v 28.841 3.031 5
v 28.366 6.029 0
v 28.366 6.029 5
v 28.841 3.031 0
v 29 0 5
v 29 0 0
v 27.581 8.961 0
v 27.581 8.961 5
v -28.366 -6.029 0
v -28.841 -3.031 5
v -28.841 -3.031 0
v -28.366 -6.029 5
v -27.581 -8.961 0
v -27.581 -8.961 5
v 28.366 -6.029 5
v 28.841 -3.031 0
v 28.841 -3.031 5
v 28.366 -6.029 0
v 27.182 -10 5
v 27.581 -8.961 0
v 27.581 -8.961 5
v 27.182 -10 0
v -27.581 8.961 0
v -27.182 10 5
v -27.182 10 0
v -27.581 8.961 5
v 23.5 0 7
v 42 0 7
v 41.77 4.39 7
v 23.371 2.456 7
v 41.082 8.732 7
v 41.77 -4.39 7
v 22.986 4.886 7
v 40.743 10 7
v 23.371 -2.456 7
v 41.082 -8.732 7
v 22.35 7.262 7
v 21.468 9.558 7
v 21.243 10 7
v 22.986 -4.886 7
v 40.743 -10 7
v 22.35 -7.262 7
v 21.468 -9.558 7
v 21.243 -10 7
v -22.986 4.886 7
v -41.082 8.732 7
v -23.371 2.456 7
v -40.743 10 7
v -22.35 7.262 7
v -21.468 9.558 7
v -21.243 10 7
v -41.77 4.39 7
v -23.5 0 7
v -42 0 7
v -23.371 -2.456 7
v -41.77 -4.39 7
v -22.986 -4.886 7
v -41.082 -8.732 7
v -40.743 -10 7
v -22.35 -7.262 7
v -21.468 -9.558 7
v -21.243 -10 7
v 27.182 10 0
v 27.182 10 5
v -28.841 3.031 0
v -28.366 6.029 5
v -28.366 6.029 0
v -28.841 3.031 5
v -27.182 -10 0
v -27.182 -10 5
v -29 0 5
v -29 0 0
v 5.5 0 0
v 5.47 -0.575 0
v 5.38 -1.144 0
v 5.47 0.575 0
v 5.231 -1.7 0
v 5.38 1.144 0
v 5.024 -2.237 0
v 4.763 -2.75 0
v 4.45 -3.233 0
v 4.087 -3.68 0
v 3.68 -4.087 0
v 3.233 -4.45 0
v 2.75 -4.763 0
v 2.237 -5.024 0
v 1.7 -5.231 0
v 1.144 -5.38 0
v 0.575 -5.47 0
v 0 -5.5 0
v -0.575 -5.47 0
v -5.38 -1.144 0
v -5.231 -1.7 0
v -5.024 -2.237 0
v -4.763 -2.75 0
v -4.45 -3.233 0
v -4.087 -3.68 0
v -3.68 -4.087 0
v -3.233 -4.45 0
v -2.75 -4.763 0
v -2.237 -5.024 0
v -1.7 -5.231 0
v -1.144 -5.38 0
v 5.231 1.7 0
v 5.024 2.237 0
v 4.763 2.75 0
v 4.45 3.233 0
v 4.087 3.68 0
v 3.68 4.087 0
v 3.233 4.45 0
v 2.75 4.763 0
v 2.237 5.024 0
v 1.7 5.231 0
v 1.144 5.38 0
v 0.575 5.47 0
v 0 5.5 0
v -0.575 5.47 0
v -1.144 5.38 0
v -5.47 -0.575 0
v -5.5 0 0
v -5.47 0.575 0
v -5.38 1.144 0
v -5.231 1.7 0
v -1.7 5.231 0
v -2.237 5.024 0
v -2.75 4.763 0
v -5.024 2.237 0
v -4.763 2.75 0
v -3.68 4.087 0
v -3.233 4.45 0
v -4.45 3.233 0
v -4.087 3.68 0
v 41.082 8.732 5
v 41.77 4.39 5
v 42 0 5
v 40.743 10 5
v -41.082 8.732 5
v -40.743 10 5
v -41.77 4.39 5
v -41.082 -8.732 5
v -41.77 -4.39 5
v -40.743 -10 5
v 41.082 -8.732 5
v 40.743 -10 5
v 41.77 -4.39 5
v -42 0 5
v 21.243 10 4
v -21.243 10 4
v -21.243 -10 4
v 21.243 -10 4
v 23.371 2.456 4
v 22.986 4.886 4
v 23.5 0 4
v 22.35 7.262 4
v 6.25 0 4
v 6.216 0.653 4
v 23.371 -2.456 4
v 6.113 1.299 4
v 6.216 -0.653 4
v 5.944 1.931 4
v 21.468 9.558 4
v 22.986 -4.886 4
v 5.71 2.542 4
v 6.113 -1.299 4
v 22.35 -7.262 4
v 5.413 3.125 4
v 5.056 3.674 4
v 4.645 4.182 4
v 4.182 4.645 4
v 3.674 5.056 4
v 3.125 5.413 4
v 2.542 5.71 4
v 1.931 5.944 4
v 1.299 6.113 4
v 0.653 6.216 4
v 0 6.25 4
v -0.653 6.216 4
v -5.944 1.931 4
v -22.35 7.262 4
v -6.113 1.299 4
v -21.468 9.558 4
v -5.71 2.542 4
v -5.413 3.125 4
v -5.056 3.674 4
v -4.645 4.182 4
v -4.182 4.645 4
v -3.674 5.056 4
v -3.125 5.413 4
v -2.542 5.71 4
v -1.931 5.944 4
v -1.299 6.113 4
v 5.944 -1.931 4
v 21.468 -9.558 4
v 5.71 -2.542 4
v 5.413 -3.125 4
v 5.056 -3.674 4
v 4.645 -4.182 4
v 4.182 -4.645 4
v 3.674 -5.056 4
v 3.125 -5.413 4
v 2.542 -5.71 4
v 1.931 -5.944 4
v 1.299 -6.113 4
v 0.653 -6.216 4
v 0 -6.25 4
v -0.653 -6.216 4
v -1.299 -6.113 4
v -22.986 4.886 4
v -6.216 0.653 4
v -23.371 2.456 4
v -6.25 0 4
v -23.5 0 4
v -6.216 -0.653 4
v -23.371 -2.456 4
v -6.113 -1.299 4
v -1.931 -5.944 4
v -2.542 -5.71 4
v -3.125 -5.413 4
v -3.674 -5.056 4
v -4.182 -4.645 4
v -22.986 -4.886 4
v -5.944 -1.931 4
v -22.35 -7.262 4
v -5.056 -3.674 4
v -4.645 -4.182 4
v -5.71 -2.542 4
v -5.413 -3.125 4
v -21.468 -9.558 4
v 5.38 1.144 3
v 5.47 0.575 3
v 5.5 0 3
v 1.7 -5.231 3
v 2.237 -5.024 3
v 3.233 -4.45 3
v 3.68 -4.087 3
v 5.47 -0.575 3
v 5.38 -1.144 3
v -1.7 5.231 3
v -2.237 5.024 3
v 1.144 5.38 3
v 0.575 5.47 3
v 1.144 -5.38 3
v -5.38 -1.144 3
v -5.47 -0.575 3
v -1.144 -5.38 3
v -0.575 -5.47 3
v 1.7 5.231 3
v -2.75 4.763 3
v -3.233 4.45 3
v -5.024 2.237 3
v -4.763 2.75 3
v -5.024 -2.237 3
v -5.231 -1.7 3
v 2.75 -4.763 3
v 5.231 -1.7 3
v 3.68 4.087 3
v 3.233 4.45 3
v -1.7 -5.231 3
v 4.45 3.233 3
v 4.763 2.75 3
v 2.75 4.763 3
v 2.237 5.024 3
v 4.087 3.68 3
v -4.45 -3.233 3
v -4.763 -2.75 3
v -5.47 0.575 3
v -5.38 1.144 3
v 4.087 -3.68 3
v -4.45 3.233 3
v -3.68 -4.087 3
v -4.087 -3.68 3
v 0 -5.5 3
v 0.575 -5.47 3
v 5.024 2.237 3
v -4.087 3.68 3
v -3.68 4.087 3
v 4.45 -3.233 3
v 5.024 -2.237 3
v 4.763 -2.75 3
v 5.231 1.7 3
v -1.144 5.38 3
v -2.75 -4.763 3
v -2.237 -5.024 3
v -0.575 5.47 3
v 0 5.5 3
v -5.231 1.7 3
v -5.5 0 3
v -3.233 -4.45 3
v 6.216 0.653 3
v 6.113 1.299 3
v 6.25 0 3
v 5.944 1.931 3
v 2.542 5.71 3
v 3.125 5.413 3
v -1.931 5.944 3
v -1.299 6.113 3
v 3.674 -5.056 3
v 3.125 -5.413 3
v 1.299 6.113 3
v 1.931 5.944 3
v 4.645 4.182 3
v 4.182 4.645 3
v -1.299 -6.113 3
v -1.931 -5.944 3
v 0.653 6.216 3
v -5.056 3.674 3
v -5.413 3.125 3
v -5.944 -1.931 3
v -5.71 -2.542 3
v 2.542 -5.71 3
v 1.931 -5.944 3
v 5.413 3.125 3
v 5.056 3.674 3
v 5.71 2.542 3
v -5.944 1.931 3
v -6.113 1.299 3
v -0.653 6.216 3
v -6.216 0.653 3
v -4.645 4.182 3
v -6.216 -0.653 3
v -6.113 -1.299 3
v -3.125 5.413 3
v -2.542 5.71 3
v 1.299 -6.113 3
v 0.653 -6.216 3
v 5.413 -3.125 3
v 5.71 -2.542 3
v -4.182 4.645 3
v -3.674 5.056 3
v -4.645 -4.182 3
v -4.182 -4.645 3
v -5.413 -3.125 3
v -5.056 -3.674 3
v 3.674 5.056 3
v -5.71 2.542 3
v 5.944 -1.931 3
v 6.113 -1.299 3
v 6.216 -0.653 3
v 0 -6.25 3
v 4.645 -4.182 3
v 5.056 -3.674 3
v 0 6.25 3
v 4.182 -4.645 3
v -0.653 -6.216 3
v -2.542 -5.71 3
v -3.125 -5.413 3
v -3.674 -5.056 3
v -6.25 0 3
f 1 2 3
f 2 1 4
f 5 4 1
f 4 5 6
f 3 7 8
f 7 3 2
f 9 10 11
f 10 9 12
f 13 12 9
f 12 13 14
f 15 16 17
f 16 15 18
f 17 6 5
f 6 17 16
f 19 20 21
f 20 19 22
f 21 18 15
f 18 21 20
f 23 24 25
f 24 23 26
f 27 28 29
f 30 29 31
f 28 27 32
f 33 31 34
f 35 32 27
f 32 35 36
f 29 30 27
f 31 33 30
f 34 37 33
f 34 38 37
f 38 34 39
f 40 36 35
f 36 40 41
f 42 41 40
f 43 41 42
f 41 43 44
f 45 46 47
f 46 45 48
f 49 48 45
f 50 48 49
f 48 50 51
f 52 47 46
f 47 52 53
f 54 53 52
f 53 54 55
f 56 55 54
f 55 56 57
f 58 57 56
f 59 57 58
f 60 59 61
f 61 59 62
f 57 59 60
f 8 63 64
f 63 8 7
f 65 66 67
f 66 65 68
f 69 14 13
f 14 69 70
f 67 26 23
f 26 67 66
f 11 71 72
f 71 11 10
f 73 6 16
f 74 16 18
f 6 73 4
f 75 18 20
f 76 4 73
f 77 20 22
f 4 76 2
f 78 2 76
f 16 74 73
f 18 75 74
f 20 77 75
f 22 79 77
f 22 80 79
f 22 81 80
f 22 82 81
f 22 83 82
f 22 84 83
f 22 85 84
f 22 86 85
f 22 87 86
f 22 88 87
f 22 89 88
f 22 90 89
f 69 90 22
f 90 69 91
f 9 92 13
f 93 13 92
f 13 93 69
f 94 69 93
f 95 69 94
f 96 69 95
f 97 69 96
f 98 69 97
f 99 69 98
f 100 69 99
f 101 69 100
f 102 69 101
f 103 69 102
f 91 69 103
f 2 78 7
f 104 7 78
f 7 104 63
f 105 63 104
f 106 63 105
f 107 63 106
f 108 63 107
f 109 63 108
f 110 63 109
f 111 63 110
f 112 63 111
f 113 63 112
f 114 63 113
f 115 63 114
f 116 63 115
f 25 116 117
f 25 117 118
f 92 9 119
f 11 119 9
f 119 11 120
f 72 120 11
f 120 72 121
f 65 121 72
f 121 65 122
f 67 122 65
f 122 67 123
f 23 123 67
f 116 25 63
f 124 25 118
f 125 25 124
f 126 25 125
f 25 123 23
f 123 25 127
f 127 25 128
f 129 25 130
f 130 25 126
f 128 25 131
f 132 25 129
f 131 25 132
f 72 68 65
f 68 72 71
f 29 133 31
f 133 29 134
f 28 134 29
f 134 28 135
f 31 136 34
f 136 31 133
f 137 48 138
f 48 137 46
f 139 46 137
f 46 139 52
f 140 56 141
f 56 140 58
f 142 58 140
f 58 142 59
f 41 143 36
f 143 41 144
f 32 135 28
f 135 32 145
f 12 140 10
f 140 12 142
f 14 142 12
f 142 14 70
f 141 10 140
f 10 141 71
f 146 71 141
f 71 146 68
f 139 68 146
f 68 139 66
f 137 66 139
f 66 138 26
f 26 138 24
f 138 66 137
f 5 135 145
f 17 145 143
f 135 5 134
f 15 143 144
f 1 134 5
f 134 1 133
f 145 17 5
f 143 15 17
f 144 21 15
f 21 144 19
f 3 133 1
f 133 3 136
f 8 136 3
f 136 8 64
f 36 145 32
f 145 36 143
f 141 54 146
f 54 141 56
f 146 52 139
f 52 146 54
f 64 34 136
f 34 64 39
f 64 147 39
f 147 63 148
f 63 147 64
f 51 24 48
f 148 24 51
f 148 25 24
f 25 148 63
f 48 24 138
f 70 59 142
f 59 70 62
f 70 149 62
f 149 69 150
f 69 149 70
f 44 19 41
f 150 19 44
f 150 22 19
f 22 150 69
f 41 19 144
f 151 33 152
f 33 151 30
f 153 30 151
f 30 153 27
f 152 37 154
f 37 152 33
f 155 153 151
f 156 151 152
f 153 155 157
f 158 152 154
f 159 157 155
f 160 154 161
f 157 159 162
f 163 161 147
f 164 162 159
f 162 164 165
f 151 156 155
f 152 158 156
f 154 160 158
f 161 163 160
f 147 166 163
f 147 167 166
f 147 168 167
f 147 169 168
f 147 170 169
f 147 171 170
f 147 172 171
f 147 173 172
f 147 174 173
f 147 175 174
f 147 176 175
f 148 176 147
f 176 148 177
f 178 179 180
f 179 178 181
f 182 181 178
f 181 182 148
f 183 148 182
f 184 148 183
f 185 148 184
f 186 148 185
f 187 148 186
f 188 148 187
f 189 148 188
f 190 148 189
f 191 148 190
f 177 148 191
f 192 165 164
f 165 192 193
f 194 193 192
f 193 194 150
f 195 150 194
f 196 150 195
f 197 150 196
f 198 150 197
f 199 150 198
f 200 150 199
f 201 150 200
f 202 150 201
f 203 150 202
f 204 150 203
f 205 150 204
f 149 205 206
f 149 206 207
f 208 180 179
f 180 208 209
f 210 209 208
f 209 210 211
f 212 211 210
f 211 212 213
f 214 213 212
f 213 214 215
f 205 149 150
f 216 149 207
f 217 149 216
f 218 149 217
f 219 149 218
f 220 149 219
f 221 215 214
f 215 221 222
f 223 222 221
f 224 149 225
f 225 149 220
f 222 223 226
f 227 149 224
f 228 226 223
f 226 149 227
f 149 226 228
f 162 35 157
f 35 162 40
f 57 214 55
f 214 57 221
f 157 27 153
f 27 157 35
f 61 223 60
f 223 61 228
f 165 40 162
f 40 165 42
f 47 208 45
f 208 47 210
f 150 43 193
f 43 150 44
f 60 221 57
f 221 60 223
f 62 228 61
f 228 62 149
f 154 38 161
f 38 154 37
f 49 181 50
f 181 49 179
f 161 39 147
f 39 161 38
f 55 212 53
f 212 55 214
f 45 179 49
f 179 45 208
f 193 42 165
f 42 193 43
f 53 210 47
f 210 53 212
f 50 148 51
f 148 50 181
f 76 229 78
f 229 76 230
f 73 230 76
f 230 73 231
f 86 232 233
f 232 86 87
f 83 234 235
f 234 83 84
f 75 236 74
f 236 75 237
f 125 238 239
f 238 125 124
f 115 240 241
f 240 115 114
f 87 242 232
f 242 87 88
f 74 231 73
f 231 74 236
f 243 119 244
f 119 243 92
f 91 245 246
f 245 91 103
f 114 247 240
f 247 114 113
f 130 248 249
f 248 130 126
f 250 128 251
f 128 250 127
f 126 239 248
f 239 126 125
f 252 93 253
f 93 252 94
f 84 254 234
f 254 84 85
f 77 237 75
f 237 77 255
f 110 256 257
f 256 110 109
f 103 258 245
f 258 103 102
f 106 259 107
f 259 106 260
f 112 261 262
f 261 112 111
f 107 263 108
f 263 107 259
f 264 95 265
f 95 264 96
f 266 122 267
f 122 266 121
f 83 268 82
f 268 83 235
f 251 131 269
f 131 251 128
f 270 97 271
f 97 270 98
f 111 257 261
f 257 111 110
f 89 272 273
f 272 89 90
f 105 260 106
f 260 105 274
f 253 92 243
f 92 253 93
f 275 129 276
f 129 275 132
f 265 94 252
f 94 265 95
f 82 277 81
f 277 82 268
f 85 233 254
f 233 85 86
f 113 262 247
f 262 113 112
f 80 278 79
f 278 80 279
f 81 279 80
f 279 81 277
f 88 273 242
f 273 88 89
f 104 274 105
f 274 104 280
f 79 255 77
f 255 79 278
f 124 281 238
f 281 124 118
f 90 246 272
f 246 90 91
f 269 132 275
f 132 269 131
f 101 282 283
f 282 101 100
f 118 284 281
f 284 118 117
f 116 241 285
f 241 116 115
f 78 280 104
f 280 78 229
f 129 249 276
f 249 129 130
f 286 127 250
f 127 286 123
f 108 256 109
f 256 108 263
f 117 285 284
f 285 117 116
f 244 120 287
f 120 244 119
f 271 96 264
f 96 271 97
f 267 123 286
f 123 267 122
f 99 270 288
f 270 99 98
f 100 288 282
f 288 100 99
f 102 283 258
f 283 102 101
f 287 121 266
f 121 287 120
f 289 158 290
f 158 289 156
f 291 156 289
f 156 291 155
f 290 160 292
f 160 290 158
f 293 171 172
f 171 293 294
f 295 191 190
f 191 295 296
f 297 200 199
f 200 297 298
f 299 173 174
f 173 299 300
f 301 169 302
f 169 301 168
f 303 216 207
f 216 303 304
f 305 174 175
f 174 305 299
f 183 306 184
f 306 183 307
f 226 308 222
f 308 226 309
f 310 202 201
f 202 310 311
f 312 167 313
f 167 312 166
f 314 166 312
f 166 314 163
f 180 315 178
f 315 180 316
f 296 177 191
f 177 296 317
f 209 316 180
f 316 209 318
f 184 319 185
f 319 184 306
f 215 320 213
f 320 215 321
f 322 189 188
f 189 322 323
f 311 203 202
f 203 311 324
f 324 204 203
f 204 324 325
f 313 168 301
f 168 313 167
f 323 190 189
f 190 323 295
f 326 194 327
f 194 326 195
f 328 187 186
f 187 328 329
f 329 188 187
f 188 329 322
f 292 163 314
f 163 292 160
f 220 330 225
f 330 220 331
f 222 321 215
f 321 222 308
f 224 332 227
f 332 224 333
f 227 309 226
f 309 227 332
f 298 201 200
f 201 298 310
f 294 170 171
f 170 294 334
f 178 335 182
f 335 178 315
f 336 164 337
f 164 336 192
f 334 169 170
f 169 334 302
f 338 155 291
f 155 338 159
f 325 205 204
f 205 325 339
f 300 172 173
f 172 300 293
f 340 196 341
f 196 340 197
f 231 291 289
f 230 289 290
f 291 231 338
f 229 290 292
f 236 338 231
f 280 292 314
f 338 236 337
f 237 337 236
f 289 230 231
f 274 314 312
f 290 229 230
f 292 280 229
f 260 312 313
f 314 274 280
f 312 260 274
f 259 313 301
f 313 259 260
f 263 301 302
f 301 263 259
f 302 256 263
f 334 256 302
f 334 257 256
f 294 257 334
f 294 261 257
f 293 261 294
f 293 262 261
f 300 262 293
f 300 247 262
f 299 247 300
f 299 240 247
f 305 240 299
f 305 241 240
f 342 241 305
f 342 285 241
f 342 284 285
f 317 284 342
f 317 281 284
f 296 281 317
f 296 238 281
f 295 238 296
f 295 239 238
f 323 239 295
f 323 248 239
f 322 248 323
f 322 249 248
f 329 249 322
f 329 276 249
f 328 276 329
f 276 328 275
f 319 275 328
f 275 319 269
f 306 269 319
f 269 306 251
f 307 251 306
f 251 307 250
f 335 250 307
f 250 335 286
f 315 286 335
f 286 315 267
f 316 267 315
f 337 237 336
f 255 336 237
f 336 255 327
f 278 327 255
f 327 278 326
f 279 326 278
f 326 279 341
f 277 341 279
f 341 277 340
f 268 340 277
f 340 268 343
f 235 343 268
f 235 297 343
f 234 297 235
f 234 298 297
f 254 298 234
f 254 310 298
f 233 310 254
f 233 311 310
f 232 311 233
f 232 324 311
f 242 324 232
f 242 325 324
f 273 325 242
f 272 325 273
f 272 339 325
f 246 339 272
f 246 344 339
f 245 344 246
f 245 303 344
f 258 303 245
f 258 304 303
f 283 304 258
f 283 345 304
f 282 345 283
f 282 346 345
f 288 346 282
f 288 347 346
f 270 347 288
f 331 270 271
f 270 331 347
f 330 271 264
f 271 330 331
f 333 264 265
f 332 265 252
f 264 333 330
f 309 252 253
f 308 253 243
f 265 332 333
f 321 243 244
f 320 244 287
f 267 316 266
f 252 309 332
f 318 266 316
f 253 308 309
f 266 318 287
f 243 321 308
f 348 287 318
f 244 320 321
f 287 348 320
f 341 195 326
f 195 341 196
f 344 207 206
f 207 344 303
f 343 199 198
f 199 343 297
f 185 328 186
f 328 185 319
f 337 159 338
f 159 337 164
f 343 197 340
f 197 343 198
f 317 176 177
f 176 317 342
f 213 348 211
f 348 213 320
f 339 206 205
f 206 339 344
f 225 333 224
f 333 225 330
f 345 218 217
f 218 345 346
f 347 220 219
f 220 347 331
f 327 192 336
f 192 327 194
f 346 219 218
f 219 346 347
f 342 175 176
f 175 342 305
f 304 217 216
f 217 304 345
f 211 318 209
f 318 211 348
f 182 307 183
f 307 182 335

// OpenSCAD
/* Grundplatte
  Hält das Gewicht des Läufers. 
  In der Mitte ist ein Lager das das Gewicht
  aufnehmen kann.
  
  Die beiden flachen Enden halten es in der Pyramide
  
  Am besten mit Support drucken und die flachen
  Enden nachfeilen. Das ist einfacher als
  das Loch für das Lager nachzuarbeiten.
  
  Druck mit ABS dmit es ordentlich hält
  
  Mathias Moog, 2026, CC BY NC SA
*/

// Schöne Rundungen
$fn=60;

difference() {
  union() {
    // Grundplatte
    cylinder(h=7, d=58);
    // Flache Enden, angehoben
    translate([0,0,5]) cylinder(h=2, d=84);
  }
  // Auf die Breite von 20 mm zuschneiden
  translate([-50,10,-1]) cube([100,50,20]);  
  translate([-50,-60,-1]) cube([100,50,20]);
  // In der Mitte aussparen für Laufrad und Gummi
  translate([0,0,4]) cylinder(h=10, d=47);
  // Lager unten
  translate([0,0,-1]) cylinder(h=10, d=11);
  // Lager Haltering
  translate([0,0,3]) cylinder(h=10, d=12.5);
}  
